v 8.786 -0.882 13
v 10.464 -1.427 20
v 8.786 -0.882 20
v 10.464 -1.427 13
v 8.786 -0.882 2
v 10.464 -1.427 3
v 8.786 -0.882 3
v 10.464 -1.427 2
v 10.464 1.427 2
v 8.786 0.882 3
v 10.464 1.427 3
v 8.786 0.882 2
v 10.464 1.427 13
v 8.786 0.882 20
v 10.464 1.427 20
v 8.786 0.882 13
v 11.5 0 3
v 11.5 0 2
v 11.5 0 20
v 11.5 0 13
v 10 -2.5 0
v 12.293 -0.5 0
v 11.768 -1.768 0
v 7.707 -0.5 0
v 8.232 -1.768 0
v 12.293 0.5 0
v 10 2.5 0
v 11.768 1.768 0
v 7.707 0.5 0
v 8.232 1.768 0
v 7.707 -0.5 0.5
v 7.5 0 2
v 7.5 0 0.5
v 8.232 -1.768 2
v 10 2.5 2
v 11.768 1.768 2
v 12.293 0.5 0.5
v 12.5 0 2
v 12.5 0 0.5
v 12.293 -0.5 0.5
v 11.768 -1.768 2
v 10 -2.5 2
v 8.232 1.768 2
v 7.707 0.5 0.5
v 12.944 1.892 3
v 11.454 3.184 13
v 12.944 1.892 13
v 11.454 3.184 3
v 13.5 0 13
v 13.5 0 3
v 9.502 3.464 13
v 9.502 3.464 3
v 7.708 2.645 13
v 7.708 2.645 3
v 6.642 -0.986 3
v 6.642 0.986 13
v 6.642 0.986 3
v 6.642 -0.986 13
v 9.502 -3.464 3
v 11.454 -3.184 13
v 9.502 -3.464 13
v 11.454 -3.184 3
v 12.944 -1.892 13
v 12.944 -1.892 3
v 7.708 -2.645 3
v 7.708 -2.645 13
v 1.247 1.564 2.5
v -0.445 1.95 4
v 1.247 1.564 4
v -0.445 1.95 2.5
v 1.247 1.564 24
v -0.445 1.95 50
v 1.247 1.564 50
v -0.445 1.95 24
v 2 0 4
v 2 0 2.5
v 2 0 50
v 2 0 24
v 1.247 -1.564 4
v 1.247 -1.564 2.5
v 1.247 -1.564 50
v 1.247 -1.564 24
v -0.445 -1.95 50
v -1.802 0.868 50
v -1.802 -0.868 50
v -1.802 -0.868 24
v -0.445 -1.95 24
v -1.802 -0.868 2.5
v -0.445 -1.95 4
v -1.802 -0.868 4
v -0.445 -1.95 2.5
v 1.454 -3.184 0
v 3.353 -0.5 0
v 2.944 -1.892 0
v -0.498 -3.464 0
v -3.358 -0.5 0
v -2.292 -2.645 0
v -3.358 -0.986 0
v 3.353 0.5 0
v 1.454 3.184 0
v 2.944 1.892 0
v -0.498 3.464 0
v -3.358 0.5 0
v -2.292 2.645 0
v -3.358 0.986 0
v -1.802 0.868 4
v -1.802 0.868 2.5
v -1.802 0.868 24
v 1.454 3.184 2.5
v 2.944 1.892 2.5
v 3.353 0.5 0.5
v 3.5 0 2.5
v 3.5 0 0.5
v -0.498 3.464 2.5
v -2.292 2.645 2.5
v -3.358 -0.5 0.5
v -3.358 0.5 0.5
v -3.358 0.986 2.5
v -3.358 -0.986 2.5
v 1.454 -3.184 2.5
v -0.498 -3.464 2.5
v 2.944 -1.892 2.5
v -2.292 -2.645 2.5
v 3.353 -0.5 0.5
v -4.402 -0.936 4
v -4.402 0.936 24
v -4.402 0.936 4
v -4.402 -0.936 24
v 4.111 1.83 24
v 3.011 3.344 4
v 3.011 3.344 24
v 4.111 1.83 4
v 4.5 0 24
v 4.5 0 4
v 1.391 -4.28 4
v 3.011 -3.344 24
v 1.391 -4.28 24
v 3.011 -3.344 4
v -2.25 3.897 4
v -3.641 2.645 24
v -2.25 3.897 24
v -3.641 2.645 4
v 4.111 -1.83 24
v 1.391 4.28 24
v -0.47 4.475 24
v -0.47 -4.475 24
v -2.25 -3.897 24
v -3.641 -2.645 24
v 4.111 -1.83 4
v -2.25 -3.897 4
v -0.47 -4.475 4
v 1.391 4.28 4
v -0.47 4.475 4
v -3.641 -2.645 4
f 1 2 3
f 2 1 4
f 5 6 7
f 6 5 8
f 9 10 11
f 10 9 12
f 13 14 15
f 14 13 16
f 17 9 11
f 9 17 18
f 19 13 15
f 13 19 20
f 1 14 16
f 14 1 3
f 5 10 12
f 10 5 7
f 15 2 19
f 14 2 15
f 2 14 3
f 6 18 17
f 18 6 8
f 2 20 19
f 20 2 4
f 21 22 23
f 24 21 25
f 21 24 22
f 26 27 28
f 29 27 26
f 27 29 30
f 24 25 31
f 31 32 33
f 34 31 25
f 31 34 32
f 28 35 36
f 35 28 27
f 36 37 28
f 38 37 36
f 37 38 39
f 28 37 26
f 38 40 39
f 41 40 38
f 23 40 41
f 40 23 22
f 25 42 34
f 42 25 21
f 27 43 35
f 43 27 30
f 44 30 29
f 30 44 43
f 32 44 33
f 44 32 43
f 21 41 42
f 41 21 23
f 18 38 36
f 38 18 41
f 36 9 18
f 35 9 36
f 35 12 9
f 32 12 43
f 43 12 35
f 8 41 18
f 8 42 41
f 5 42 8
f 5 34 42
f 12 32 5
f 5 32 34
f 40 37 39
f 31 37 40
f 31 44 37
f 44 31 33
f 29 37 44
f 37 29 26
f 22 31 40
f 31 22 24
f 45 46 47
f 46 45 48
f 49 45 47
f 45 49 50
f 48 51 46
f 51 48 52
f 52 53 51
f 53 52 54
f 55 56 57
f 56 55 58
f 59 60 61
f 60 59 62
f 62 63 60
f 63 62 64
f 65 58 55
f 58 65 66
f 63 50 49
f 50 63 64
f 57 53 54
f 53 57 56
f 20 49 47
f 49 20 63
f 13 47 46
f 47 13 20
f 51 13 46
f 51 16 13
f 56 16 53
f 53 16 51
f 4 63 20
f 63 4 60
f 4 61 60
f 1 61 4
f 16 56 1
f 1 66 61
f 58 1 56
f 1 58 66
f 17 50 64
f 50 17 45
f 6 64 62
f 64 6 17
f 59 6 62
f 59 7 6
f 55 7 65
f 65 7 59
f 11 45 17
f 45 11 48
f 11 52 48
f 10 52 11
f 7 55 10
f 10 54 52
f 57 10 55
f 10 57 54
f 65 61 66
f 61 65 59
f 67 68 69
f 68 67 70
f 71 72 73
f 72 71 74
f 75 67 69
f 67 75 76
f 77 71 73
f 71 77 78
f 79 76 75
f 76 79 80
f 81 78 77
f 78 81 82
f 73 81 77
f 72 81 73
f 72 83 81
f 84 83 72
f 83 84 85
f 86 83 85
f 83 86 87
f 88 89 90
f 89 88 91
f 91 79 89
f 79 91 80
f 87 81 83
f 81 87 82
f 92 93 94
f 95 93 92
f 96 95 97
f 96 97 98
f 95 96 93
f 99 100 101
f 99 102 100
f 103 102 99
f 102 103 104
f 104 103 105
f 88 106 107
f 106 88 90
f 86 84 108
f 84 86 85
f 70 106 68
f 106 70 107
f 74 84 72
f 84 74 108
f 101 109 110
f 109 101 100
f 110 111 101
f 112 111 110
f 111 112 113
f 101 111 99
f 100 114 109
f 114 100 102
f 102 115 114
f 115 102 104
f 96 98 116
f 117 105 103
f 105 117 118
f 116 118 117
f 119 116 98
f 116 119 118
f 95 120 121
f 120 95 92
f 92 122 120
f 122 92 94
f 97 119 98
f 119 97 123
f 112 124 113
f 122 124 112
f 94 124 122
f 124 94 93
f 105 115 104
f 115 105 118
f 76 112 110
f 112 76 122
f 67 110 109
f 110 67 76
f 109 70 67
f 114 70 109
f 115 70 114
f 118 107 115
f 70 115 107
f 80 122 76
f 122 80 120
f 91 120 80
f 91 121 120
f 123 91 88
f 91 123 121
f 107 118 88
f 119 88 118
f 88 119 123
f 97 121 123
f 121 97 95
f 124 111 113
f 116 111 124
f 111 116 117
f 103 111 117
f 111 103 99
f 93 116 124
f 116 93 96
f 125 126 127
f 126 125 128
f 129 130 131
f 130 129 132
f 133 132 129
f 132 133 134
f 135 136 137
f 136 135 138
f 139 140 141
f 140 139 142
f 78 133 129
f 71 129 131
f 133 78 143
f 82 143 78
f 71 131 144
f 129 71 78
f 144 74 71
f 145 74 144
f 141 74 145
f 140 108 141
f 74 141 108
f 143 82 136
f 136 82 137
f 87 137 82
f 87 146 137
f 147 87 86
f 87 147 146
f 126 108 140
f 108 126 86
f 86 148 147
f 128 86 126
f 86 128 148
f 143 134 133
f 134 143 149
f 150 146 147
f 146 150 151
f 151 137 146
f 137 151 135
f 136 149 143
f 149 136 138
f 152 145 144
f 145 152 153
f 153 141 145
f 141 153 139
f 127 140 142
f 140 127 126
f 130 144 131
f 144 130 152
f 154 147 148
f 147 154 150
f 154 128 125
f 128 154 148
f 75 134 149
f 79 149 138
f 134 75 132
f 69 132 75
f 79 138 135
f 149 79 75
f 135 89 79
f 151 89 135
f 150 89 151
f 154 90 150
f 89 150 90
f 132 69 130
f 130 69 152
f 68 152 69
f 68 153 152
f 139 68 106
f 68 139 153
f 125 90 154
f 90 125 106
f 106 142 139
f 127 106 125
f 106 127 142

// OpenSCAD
// Screws and Spacers for the LightClock project
//
// Pierre Cauchois (pierreca)
// 5/18/2014

module spacer(x,y,z) {
	color("black")
	translate([x,y,z]) {
		difference() {
			cylinder(h = 10, r = 3.5);
			cylinder(h = 10, r = 1.5);
		}
	}
}

module big_spacer(x,y,z) {
	color("silver")
	translate([x,y,z]) {
		difference() {
			cylinder(h = 20, r = 4.5);
			cylinder(h = 20, r = 2);
		}
	}
}

module screw (x,y,z) {
	color("silver")
	translate([x,y,z]) {
		difference() {
			union() {
				cylinder(h = 20, r = 1.5);
				cylinder(h = 2, r = 2.5);
			}
			translate([-3, -0.5, -0.5]) cube(size=[6, 1, 1]);
		}
	}
}

module long_screw (x,y,z) {
	color("silver")
	translate([x,y,z]) {
		difference() {
			union () {
				cylinder(h = 50, r = 2);
				cylinder(h = 2.5, r = 3.5);
			}
			translate([-4, -0.5, -0.5]) cube(size=[8, 1, 1]);
		}
	}
}

screw(10,0,0);
spacer(10,0,3);

long_screw(0,0,0);
big_spacer(0,0,4);
